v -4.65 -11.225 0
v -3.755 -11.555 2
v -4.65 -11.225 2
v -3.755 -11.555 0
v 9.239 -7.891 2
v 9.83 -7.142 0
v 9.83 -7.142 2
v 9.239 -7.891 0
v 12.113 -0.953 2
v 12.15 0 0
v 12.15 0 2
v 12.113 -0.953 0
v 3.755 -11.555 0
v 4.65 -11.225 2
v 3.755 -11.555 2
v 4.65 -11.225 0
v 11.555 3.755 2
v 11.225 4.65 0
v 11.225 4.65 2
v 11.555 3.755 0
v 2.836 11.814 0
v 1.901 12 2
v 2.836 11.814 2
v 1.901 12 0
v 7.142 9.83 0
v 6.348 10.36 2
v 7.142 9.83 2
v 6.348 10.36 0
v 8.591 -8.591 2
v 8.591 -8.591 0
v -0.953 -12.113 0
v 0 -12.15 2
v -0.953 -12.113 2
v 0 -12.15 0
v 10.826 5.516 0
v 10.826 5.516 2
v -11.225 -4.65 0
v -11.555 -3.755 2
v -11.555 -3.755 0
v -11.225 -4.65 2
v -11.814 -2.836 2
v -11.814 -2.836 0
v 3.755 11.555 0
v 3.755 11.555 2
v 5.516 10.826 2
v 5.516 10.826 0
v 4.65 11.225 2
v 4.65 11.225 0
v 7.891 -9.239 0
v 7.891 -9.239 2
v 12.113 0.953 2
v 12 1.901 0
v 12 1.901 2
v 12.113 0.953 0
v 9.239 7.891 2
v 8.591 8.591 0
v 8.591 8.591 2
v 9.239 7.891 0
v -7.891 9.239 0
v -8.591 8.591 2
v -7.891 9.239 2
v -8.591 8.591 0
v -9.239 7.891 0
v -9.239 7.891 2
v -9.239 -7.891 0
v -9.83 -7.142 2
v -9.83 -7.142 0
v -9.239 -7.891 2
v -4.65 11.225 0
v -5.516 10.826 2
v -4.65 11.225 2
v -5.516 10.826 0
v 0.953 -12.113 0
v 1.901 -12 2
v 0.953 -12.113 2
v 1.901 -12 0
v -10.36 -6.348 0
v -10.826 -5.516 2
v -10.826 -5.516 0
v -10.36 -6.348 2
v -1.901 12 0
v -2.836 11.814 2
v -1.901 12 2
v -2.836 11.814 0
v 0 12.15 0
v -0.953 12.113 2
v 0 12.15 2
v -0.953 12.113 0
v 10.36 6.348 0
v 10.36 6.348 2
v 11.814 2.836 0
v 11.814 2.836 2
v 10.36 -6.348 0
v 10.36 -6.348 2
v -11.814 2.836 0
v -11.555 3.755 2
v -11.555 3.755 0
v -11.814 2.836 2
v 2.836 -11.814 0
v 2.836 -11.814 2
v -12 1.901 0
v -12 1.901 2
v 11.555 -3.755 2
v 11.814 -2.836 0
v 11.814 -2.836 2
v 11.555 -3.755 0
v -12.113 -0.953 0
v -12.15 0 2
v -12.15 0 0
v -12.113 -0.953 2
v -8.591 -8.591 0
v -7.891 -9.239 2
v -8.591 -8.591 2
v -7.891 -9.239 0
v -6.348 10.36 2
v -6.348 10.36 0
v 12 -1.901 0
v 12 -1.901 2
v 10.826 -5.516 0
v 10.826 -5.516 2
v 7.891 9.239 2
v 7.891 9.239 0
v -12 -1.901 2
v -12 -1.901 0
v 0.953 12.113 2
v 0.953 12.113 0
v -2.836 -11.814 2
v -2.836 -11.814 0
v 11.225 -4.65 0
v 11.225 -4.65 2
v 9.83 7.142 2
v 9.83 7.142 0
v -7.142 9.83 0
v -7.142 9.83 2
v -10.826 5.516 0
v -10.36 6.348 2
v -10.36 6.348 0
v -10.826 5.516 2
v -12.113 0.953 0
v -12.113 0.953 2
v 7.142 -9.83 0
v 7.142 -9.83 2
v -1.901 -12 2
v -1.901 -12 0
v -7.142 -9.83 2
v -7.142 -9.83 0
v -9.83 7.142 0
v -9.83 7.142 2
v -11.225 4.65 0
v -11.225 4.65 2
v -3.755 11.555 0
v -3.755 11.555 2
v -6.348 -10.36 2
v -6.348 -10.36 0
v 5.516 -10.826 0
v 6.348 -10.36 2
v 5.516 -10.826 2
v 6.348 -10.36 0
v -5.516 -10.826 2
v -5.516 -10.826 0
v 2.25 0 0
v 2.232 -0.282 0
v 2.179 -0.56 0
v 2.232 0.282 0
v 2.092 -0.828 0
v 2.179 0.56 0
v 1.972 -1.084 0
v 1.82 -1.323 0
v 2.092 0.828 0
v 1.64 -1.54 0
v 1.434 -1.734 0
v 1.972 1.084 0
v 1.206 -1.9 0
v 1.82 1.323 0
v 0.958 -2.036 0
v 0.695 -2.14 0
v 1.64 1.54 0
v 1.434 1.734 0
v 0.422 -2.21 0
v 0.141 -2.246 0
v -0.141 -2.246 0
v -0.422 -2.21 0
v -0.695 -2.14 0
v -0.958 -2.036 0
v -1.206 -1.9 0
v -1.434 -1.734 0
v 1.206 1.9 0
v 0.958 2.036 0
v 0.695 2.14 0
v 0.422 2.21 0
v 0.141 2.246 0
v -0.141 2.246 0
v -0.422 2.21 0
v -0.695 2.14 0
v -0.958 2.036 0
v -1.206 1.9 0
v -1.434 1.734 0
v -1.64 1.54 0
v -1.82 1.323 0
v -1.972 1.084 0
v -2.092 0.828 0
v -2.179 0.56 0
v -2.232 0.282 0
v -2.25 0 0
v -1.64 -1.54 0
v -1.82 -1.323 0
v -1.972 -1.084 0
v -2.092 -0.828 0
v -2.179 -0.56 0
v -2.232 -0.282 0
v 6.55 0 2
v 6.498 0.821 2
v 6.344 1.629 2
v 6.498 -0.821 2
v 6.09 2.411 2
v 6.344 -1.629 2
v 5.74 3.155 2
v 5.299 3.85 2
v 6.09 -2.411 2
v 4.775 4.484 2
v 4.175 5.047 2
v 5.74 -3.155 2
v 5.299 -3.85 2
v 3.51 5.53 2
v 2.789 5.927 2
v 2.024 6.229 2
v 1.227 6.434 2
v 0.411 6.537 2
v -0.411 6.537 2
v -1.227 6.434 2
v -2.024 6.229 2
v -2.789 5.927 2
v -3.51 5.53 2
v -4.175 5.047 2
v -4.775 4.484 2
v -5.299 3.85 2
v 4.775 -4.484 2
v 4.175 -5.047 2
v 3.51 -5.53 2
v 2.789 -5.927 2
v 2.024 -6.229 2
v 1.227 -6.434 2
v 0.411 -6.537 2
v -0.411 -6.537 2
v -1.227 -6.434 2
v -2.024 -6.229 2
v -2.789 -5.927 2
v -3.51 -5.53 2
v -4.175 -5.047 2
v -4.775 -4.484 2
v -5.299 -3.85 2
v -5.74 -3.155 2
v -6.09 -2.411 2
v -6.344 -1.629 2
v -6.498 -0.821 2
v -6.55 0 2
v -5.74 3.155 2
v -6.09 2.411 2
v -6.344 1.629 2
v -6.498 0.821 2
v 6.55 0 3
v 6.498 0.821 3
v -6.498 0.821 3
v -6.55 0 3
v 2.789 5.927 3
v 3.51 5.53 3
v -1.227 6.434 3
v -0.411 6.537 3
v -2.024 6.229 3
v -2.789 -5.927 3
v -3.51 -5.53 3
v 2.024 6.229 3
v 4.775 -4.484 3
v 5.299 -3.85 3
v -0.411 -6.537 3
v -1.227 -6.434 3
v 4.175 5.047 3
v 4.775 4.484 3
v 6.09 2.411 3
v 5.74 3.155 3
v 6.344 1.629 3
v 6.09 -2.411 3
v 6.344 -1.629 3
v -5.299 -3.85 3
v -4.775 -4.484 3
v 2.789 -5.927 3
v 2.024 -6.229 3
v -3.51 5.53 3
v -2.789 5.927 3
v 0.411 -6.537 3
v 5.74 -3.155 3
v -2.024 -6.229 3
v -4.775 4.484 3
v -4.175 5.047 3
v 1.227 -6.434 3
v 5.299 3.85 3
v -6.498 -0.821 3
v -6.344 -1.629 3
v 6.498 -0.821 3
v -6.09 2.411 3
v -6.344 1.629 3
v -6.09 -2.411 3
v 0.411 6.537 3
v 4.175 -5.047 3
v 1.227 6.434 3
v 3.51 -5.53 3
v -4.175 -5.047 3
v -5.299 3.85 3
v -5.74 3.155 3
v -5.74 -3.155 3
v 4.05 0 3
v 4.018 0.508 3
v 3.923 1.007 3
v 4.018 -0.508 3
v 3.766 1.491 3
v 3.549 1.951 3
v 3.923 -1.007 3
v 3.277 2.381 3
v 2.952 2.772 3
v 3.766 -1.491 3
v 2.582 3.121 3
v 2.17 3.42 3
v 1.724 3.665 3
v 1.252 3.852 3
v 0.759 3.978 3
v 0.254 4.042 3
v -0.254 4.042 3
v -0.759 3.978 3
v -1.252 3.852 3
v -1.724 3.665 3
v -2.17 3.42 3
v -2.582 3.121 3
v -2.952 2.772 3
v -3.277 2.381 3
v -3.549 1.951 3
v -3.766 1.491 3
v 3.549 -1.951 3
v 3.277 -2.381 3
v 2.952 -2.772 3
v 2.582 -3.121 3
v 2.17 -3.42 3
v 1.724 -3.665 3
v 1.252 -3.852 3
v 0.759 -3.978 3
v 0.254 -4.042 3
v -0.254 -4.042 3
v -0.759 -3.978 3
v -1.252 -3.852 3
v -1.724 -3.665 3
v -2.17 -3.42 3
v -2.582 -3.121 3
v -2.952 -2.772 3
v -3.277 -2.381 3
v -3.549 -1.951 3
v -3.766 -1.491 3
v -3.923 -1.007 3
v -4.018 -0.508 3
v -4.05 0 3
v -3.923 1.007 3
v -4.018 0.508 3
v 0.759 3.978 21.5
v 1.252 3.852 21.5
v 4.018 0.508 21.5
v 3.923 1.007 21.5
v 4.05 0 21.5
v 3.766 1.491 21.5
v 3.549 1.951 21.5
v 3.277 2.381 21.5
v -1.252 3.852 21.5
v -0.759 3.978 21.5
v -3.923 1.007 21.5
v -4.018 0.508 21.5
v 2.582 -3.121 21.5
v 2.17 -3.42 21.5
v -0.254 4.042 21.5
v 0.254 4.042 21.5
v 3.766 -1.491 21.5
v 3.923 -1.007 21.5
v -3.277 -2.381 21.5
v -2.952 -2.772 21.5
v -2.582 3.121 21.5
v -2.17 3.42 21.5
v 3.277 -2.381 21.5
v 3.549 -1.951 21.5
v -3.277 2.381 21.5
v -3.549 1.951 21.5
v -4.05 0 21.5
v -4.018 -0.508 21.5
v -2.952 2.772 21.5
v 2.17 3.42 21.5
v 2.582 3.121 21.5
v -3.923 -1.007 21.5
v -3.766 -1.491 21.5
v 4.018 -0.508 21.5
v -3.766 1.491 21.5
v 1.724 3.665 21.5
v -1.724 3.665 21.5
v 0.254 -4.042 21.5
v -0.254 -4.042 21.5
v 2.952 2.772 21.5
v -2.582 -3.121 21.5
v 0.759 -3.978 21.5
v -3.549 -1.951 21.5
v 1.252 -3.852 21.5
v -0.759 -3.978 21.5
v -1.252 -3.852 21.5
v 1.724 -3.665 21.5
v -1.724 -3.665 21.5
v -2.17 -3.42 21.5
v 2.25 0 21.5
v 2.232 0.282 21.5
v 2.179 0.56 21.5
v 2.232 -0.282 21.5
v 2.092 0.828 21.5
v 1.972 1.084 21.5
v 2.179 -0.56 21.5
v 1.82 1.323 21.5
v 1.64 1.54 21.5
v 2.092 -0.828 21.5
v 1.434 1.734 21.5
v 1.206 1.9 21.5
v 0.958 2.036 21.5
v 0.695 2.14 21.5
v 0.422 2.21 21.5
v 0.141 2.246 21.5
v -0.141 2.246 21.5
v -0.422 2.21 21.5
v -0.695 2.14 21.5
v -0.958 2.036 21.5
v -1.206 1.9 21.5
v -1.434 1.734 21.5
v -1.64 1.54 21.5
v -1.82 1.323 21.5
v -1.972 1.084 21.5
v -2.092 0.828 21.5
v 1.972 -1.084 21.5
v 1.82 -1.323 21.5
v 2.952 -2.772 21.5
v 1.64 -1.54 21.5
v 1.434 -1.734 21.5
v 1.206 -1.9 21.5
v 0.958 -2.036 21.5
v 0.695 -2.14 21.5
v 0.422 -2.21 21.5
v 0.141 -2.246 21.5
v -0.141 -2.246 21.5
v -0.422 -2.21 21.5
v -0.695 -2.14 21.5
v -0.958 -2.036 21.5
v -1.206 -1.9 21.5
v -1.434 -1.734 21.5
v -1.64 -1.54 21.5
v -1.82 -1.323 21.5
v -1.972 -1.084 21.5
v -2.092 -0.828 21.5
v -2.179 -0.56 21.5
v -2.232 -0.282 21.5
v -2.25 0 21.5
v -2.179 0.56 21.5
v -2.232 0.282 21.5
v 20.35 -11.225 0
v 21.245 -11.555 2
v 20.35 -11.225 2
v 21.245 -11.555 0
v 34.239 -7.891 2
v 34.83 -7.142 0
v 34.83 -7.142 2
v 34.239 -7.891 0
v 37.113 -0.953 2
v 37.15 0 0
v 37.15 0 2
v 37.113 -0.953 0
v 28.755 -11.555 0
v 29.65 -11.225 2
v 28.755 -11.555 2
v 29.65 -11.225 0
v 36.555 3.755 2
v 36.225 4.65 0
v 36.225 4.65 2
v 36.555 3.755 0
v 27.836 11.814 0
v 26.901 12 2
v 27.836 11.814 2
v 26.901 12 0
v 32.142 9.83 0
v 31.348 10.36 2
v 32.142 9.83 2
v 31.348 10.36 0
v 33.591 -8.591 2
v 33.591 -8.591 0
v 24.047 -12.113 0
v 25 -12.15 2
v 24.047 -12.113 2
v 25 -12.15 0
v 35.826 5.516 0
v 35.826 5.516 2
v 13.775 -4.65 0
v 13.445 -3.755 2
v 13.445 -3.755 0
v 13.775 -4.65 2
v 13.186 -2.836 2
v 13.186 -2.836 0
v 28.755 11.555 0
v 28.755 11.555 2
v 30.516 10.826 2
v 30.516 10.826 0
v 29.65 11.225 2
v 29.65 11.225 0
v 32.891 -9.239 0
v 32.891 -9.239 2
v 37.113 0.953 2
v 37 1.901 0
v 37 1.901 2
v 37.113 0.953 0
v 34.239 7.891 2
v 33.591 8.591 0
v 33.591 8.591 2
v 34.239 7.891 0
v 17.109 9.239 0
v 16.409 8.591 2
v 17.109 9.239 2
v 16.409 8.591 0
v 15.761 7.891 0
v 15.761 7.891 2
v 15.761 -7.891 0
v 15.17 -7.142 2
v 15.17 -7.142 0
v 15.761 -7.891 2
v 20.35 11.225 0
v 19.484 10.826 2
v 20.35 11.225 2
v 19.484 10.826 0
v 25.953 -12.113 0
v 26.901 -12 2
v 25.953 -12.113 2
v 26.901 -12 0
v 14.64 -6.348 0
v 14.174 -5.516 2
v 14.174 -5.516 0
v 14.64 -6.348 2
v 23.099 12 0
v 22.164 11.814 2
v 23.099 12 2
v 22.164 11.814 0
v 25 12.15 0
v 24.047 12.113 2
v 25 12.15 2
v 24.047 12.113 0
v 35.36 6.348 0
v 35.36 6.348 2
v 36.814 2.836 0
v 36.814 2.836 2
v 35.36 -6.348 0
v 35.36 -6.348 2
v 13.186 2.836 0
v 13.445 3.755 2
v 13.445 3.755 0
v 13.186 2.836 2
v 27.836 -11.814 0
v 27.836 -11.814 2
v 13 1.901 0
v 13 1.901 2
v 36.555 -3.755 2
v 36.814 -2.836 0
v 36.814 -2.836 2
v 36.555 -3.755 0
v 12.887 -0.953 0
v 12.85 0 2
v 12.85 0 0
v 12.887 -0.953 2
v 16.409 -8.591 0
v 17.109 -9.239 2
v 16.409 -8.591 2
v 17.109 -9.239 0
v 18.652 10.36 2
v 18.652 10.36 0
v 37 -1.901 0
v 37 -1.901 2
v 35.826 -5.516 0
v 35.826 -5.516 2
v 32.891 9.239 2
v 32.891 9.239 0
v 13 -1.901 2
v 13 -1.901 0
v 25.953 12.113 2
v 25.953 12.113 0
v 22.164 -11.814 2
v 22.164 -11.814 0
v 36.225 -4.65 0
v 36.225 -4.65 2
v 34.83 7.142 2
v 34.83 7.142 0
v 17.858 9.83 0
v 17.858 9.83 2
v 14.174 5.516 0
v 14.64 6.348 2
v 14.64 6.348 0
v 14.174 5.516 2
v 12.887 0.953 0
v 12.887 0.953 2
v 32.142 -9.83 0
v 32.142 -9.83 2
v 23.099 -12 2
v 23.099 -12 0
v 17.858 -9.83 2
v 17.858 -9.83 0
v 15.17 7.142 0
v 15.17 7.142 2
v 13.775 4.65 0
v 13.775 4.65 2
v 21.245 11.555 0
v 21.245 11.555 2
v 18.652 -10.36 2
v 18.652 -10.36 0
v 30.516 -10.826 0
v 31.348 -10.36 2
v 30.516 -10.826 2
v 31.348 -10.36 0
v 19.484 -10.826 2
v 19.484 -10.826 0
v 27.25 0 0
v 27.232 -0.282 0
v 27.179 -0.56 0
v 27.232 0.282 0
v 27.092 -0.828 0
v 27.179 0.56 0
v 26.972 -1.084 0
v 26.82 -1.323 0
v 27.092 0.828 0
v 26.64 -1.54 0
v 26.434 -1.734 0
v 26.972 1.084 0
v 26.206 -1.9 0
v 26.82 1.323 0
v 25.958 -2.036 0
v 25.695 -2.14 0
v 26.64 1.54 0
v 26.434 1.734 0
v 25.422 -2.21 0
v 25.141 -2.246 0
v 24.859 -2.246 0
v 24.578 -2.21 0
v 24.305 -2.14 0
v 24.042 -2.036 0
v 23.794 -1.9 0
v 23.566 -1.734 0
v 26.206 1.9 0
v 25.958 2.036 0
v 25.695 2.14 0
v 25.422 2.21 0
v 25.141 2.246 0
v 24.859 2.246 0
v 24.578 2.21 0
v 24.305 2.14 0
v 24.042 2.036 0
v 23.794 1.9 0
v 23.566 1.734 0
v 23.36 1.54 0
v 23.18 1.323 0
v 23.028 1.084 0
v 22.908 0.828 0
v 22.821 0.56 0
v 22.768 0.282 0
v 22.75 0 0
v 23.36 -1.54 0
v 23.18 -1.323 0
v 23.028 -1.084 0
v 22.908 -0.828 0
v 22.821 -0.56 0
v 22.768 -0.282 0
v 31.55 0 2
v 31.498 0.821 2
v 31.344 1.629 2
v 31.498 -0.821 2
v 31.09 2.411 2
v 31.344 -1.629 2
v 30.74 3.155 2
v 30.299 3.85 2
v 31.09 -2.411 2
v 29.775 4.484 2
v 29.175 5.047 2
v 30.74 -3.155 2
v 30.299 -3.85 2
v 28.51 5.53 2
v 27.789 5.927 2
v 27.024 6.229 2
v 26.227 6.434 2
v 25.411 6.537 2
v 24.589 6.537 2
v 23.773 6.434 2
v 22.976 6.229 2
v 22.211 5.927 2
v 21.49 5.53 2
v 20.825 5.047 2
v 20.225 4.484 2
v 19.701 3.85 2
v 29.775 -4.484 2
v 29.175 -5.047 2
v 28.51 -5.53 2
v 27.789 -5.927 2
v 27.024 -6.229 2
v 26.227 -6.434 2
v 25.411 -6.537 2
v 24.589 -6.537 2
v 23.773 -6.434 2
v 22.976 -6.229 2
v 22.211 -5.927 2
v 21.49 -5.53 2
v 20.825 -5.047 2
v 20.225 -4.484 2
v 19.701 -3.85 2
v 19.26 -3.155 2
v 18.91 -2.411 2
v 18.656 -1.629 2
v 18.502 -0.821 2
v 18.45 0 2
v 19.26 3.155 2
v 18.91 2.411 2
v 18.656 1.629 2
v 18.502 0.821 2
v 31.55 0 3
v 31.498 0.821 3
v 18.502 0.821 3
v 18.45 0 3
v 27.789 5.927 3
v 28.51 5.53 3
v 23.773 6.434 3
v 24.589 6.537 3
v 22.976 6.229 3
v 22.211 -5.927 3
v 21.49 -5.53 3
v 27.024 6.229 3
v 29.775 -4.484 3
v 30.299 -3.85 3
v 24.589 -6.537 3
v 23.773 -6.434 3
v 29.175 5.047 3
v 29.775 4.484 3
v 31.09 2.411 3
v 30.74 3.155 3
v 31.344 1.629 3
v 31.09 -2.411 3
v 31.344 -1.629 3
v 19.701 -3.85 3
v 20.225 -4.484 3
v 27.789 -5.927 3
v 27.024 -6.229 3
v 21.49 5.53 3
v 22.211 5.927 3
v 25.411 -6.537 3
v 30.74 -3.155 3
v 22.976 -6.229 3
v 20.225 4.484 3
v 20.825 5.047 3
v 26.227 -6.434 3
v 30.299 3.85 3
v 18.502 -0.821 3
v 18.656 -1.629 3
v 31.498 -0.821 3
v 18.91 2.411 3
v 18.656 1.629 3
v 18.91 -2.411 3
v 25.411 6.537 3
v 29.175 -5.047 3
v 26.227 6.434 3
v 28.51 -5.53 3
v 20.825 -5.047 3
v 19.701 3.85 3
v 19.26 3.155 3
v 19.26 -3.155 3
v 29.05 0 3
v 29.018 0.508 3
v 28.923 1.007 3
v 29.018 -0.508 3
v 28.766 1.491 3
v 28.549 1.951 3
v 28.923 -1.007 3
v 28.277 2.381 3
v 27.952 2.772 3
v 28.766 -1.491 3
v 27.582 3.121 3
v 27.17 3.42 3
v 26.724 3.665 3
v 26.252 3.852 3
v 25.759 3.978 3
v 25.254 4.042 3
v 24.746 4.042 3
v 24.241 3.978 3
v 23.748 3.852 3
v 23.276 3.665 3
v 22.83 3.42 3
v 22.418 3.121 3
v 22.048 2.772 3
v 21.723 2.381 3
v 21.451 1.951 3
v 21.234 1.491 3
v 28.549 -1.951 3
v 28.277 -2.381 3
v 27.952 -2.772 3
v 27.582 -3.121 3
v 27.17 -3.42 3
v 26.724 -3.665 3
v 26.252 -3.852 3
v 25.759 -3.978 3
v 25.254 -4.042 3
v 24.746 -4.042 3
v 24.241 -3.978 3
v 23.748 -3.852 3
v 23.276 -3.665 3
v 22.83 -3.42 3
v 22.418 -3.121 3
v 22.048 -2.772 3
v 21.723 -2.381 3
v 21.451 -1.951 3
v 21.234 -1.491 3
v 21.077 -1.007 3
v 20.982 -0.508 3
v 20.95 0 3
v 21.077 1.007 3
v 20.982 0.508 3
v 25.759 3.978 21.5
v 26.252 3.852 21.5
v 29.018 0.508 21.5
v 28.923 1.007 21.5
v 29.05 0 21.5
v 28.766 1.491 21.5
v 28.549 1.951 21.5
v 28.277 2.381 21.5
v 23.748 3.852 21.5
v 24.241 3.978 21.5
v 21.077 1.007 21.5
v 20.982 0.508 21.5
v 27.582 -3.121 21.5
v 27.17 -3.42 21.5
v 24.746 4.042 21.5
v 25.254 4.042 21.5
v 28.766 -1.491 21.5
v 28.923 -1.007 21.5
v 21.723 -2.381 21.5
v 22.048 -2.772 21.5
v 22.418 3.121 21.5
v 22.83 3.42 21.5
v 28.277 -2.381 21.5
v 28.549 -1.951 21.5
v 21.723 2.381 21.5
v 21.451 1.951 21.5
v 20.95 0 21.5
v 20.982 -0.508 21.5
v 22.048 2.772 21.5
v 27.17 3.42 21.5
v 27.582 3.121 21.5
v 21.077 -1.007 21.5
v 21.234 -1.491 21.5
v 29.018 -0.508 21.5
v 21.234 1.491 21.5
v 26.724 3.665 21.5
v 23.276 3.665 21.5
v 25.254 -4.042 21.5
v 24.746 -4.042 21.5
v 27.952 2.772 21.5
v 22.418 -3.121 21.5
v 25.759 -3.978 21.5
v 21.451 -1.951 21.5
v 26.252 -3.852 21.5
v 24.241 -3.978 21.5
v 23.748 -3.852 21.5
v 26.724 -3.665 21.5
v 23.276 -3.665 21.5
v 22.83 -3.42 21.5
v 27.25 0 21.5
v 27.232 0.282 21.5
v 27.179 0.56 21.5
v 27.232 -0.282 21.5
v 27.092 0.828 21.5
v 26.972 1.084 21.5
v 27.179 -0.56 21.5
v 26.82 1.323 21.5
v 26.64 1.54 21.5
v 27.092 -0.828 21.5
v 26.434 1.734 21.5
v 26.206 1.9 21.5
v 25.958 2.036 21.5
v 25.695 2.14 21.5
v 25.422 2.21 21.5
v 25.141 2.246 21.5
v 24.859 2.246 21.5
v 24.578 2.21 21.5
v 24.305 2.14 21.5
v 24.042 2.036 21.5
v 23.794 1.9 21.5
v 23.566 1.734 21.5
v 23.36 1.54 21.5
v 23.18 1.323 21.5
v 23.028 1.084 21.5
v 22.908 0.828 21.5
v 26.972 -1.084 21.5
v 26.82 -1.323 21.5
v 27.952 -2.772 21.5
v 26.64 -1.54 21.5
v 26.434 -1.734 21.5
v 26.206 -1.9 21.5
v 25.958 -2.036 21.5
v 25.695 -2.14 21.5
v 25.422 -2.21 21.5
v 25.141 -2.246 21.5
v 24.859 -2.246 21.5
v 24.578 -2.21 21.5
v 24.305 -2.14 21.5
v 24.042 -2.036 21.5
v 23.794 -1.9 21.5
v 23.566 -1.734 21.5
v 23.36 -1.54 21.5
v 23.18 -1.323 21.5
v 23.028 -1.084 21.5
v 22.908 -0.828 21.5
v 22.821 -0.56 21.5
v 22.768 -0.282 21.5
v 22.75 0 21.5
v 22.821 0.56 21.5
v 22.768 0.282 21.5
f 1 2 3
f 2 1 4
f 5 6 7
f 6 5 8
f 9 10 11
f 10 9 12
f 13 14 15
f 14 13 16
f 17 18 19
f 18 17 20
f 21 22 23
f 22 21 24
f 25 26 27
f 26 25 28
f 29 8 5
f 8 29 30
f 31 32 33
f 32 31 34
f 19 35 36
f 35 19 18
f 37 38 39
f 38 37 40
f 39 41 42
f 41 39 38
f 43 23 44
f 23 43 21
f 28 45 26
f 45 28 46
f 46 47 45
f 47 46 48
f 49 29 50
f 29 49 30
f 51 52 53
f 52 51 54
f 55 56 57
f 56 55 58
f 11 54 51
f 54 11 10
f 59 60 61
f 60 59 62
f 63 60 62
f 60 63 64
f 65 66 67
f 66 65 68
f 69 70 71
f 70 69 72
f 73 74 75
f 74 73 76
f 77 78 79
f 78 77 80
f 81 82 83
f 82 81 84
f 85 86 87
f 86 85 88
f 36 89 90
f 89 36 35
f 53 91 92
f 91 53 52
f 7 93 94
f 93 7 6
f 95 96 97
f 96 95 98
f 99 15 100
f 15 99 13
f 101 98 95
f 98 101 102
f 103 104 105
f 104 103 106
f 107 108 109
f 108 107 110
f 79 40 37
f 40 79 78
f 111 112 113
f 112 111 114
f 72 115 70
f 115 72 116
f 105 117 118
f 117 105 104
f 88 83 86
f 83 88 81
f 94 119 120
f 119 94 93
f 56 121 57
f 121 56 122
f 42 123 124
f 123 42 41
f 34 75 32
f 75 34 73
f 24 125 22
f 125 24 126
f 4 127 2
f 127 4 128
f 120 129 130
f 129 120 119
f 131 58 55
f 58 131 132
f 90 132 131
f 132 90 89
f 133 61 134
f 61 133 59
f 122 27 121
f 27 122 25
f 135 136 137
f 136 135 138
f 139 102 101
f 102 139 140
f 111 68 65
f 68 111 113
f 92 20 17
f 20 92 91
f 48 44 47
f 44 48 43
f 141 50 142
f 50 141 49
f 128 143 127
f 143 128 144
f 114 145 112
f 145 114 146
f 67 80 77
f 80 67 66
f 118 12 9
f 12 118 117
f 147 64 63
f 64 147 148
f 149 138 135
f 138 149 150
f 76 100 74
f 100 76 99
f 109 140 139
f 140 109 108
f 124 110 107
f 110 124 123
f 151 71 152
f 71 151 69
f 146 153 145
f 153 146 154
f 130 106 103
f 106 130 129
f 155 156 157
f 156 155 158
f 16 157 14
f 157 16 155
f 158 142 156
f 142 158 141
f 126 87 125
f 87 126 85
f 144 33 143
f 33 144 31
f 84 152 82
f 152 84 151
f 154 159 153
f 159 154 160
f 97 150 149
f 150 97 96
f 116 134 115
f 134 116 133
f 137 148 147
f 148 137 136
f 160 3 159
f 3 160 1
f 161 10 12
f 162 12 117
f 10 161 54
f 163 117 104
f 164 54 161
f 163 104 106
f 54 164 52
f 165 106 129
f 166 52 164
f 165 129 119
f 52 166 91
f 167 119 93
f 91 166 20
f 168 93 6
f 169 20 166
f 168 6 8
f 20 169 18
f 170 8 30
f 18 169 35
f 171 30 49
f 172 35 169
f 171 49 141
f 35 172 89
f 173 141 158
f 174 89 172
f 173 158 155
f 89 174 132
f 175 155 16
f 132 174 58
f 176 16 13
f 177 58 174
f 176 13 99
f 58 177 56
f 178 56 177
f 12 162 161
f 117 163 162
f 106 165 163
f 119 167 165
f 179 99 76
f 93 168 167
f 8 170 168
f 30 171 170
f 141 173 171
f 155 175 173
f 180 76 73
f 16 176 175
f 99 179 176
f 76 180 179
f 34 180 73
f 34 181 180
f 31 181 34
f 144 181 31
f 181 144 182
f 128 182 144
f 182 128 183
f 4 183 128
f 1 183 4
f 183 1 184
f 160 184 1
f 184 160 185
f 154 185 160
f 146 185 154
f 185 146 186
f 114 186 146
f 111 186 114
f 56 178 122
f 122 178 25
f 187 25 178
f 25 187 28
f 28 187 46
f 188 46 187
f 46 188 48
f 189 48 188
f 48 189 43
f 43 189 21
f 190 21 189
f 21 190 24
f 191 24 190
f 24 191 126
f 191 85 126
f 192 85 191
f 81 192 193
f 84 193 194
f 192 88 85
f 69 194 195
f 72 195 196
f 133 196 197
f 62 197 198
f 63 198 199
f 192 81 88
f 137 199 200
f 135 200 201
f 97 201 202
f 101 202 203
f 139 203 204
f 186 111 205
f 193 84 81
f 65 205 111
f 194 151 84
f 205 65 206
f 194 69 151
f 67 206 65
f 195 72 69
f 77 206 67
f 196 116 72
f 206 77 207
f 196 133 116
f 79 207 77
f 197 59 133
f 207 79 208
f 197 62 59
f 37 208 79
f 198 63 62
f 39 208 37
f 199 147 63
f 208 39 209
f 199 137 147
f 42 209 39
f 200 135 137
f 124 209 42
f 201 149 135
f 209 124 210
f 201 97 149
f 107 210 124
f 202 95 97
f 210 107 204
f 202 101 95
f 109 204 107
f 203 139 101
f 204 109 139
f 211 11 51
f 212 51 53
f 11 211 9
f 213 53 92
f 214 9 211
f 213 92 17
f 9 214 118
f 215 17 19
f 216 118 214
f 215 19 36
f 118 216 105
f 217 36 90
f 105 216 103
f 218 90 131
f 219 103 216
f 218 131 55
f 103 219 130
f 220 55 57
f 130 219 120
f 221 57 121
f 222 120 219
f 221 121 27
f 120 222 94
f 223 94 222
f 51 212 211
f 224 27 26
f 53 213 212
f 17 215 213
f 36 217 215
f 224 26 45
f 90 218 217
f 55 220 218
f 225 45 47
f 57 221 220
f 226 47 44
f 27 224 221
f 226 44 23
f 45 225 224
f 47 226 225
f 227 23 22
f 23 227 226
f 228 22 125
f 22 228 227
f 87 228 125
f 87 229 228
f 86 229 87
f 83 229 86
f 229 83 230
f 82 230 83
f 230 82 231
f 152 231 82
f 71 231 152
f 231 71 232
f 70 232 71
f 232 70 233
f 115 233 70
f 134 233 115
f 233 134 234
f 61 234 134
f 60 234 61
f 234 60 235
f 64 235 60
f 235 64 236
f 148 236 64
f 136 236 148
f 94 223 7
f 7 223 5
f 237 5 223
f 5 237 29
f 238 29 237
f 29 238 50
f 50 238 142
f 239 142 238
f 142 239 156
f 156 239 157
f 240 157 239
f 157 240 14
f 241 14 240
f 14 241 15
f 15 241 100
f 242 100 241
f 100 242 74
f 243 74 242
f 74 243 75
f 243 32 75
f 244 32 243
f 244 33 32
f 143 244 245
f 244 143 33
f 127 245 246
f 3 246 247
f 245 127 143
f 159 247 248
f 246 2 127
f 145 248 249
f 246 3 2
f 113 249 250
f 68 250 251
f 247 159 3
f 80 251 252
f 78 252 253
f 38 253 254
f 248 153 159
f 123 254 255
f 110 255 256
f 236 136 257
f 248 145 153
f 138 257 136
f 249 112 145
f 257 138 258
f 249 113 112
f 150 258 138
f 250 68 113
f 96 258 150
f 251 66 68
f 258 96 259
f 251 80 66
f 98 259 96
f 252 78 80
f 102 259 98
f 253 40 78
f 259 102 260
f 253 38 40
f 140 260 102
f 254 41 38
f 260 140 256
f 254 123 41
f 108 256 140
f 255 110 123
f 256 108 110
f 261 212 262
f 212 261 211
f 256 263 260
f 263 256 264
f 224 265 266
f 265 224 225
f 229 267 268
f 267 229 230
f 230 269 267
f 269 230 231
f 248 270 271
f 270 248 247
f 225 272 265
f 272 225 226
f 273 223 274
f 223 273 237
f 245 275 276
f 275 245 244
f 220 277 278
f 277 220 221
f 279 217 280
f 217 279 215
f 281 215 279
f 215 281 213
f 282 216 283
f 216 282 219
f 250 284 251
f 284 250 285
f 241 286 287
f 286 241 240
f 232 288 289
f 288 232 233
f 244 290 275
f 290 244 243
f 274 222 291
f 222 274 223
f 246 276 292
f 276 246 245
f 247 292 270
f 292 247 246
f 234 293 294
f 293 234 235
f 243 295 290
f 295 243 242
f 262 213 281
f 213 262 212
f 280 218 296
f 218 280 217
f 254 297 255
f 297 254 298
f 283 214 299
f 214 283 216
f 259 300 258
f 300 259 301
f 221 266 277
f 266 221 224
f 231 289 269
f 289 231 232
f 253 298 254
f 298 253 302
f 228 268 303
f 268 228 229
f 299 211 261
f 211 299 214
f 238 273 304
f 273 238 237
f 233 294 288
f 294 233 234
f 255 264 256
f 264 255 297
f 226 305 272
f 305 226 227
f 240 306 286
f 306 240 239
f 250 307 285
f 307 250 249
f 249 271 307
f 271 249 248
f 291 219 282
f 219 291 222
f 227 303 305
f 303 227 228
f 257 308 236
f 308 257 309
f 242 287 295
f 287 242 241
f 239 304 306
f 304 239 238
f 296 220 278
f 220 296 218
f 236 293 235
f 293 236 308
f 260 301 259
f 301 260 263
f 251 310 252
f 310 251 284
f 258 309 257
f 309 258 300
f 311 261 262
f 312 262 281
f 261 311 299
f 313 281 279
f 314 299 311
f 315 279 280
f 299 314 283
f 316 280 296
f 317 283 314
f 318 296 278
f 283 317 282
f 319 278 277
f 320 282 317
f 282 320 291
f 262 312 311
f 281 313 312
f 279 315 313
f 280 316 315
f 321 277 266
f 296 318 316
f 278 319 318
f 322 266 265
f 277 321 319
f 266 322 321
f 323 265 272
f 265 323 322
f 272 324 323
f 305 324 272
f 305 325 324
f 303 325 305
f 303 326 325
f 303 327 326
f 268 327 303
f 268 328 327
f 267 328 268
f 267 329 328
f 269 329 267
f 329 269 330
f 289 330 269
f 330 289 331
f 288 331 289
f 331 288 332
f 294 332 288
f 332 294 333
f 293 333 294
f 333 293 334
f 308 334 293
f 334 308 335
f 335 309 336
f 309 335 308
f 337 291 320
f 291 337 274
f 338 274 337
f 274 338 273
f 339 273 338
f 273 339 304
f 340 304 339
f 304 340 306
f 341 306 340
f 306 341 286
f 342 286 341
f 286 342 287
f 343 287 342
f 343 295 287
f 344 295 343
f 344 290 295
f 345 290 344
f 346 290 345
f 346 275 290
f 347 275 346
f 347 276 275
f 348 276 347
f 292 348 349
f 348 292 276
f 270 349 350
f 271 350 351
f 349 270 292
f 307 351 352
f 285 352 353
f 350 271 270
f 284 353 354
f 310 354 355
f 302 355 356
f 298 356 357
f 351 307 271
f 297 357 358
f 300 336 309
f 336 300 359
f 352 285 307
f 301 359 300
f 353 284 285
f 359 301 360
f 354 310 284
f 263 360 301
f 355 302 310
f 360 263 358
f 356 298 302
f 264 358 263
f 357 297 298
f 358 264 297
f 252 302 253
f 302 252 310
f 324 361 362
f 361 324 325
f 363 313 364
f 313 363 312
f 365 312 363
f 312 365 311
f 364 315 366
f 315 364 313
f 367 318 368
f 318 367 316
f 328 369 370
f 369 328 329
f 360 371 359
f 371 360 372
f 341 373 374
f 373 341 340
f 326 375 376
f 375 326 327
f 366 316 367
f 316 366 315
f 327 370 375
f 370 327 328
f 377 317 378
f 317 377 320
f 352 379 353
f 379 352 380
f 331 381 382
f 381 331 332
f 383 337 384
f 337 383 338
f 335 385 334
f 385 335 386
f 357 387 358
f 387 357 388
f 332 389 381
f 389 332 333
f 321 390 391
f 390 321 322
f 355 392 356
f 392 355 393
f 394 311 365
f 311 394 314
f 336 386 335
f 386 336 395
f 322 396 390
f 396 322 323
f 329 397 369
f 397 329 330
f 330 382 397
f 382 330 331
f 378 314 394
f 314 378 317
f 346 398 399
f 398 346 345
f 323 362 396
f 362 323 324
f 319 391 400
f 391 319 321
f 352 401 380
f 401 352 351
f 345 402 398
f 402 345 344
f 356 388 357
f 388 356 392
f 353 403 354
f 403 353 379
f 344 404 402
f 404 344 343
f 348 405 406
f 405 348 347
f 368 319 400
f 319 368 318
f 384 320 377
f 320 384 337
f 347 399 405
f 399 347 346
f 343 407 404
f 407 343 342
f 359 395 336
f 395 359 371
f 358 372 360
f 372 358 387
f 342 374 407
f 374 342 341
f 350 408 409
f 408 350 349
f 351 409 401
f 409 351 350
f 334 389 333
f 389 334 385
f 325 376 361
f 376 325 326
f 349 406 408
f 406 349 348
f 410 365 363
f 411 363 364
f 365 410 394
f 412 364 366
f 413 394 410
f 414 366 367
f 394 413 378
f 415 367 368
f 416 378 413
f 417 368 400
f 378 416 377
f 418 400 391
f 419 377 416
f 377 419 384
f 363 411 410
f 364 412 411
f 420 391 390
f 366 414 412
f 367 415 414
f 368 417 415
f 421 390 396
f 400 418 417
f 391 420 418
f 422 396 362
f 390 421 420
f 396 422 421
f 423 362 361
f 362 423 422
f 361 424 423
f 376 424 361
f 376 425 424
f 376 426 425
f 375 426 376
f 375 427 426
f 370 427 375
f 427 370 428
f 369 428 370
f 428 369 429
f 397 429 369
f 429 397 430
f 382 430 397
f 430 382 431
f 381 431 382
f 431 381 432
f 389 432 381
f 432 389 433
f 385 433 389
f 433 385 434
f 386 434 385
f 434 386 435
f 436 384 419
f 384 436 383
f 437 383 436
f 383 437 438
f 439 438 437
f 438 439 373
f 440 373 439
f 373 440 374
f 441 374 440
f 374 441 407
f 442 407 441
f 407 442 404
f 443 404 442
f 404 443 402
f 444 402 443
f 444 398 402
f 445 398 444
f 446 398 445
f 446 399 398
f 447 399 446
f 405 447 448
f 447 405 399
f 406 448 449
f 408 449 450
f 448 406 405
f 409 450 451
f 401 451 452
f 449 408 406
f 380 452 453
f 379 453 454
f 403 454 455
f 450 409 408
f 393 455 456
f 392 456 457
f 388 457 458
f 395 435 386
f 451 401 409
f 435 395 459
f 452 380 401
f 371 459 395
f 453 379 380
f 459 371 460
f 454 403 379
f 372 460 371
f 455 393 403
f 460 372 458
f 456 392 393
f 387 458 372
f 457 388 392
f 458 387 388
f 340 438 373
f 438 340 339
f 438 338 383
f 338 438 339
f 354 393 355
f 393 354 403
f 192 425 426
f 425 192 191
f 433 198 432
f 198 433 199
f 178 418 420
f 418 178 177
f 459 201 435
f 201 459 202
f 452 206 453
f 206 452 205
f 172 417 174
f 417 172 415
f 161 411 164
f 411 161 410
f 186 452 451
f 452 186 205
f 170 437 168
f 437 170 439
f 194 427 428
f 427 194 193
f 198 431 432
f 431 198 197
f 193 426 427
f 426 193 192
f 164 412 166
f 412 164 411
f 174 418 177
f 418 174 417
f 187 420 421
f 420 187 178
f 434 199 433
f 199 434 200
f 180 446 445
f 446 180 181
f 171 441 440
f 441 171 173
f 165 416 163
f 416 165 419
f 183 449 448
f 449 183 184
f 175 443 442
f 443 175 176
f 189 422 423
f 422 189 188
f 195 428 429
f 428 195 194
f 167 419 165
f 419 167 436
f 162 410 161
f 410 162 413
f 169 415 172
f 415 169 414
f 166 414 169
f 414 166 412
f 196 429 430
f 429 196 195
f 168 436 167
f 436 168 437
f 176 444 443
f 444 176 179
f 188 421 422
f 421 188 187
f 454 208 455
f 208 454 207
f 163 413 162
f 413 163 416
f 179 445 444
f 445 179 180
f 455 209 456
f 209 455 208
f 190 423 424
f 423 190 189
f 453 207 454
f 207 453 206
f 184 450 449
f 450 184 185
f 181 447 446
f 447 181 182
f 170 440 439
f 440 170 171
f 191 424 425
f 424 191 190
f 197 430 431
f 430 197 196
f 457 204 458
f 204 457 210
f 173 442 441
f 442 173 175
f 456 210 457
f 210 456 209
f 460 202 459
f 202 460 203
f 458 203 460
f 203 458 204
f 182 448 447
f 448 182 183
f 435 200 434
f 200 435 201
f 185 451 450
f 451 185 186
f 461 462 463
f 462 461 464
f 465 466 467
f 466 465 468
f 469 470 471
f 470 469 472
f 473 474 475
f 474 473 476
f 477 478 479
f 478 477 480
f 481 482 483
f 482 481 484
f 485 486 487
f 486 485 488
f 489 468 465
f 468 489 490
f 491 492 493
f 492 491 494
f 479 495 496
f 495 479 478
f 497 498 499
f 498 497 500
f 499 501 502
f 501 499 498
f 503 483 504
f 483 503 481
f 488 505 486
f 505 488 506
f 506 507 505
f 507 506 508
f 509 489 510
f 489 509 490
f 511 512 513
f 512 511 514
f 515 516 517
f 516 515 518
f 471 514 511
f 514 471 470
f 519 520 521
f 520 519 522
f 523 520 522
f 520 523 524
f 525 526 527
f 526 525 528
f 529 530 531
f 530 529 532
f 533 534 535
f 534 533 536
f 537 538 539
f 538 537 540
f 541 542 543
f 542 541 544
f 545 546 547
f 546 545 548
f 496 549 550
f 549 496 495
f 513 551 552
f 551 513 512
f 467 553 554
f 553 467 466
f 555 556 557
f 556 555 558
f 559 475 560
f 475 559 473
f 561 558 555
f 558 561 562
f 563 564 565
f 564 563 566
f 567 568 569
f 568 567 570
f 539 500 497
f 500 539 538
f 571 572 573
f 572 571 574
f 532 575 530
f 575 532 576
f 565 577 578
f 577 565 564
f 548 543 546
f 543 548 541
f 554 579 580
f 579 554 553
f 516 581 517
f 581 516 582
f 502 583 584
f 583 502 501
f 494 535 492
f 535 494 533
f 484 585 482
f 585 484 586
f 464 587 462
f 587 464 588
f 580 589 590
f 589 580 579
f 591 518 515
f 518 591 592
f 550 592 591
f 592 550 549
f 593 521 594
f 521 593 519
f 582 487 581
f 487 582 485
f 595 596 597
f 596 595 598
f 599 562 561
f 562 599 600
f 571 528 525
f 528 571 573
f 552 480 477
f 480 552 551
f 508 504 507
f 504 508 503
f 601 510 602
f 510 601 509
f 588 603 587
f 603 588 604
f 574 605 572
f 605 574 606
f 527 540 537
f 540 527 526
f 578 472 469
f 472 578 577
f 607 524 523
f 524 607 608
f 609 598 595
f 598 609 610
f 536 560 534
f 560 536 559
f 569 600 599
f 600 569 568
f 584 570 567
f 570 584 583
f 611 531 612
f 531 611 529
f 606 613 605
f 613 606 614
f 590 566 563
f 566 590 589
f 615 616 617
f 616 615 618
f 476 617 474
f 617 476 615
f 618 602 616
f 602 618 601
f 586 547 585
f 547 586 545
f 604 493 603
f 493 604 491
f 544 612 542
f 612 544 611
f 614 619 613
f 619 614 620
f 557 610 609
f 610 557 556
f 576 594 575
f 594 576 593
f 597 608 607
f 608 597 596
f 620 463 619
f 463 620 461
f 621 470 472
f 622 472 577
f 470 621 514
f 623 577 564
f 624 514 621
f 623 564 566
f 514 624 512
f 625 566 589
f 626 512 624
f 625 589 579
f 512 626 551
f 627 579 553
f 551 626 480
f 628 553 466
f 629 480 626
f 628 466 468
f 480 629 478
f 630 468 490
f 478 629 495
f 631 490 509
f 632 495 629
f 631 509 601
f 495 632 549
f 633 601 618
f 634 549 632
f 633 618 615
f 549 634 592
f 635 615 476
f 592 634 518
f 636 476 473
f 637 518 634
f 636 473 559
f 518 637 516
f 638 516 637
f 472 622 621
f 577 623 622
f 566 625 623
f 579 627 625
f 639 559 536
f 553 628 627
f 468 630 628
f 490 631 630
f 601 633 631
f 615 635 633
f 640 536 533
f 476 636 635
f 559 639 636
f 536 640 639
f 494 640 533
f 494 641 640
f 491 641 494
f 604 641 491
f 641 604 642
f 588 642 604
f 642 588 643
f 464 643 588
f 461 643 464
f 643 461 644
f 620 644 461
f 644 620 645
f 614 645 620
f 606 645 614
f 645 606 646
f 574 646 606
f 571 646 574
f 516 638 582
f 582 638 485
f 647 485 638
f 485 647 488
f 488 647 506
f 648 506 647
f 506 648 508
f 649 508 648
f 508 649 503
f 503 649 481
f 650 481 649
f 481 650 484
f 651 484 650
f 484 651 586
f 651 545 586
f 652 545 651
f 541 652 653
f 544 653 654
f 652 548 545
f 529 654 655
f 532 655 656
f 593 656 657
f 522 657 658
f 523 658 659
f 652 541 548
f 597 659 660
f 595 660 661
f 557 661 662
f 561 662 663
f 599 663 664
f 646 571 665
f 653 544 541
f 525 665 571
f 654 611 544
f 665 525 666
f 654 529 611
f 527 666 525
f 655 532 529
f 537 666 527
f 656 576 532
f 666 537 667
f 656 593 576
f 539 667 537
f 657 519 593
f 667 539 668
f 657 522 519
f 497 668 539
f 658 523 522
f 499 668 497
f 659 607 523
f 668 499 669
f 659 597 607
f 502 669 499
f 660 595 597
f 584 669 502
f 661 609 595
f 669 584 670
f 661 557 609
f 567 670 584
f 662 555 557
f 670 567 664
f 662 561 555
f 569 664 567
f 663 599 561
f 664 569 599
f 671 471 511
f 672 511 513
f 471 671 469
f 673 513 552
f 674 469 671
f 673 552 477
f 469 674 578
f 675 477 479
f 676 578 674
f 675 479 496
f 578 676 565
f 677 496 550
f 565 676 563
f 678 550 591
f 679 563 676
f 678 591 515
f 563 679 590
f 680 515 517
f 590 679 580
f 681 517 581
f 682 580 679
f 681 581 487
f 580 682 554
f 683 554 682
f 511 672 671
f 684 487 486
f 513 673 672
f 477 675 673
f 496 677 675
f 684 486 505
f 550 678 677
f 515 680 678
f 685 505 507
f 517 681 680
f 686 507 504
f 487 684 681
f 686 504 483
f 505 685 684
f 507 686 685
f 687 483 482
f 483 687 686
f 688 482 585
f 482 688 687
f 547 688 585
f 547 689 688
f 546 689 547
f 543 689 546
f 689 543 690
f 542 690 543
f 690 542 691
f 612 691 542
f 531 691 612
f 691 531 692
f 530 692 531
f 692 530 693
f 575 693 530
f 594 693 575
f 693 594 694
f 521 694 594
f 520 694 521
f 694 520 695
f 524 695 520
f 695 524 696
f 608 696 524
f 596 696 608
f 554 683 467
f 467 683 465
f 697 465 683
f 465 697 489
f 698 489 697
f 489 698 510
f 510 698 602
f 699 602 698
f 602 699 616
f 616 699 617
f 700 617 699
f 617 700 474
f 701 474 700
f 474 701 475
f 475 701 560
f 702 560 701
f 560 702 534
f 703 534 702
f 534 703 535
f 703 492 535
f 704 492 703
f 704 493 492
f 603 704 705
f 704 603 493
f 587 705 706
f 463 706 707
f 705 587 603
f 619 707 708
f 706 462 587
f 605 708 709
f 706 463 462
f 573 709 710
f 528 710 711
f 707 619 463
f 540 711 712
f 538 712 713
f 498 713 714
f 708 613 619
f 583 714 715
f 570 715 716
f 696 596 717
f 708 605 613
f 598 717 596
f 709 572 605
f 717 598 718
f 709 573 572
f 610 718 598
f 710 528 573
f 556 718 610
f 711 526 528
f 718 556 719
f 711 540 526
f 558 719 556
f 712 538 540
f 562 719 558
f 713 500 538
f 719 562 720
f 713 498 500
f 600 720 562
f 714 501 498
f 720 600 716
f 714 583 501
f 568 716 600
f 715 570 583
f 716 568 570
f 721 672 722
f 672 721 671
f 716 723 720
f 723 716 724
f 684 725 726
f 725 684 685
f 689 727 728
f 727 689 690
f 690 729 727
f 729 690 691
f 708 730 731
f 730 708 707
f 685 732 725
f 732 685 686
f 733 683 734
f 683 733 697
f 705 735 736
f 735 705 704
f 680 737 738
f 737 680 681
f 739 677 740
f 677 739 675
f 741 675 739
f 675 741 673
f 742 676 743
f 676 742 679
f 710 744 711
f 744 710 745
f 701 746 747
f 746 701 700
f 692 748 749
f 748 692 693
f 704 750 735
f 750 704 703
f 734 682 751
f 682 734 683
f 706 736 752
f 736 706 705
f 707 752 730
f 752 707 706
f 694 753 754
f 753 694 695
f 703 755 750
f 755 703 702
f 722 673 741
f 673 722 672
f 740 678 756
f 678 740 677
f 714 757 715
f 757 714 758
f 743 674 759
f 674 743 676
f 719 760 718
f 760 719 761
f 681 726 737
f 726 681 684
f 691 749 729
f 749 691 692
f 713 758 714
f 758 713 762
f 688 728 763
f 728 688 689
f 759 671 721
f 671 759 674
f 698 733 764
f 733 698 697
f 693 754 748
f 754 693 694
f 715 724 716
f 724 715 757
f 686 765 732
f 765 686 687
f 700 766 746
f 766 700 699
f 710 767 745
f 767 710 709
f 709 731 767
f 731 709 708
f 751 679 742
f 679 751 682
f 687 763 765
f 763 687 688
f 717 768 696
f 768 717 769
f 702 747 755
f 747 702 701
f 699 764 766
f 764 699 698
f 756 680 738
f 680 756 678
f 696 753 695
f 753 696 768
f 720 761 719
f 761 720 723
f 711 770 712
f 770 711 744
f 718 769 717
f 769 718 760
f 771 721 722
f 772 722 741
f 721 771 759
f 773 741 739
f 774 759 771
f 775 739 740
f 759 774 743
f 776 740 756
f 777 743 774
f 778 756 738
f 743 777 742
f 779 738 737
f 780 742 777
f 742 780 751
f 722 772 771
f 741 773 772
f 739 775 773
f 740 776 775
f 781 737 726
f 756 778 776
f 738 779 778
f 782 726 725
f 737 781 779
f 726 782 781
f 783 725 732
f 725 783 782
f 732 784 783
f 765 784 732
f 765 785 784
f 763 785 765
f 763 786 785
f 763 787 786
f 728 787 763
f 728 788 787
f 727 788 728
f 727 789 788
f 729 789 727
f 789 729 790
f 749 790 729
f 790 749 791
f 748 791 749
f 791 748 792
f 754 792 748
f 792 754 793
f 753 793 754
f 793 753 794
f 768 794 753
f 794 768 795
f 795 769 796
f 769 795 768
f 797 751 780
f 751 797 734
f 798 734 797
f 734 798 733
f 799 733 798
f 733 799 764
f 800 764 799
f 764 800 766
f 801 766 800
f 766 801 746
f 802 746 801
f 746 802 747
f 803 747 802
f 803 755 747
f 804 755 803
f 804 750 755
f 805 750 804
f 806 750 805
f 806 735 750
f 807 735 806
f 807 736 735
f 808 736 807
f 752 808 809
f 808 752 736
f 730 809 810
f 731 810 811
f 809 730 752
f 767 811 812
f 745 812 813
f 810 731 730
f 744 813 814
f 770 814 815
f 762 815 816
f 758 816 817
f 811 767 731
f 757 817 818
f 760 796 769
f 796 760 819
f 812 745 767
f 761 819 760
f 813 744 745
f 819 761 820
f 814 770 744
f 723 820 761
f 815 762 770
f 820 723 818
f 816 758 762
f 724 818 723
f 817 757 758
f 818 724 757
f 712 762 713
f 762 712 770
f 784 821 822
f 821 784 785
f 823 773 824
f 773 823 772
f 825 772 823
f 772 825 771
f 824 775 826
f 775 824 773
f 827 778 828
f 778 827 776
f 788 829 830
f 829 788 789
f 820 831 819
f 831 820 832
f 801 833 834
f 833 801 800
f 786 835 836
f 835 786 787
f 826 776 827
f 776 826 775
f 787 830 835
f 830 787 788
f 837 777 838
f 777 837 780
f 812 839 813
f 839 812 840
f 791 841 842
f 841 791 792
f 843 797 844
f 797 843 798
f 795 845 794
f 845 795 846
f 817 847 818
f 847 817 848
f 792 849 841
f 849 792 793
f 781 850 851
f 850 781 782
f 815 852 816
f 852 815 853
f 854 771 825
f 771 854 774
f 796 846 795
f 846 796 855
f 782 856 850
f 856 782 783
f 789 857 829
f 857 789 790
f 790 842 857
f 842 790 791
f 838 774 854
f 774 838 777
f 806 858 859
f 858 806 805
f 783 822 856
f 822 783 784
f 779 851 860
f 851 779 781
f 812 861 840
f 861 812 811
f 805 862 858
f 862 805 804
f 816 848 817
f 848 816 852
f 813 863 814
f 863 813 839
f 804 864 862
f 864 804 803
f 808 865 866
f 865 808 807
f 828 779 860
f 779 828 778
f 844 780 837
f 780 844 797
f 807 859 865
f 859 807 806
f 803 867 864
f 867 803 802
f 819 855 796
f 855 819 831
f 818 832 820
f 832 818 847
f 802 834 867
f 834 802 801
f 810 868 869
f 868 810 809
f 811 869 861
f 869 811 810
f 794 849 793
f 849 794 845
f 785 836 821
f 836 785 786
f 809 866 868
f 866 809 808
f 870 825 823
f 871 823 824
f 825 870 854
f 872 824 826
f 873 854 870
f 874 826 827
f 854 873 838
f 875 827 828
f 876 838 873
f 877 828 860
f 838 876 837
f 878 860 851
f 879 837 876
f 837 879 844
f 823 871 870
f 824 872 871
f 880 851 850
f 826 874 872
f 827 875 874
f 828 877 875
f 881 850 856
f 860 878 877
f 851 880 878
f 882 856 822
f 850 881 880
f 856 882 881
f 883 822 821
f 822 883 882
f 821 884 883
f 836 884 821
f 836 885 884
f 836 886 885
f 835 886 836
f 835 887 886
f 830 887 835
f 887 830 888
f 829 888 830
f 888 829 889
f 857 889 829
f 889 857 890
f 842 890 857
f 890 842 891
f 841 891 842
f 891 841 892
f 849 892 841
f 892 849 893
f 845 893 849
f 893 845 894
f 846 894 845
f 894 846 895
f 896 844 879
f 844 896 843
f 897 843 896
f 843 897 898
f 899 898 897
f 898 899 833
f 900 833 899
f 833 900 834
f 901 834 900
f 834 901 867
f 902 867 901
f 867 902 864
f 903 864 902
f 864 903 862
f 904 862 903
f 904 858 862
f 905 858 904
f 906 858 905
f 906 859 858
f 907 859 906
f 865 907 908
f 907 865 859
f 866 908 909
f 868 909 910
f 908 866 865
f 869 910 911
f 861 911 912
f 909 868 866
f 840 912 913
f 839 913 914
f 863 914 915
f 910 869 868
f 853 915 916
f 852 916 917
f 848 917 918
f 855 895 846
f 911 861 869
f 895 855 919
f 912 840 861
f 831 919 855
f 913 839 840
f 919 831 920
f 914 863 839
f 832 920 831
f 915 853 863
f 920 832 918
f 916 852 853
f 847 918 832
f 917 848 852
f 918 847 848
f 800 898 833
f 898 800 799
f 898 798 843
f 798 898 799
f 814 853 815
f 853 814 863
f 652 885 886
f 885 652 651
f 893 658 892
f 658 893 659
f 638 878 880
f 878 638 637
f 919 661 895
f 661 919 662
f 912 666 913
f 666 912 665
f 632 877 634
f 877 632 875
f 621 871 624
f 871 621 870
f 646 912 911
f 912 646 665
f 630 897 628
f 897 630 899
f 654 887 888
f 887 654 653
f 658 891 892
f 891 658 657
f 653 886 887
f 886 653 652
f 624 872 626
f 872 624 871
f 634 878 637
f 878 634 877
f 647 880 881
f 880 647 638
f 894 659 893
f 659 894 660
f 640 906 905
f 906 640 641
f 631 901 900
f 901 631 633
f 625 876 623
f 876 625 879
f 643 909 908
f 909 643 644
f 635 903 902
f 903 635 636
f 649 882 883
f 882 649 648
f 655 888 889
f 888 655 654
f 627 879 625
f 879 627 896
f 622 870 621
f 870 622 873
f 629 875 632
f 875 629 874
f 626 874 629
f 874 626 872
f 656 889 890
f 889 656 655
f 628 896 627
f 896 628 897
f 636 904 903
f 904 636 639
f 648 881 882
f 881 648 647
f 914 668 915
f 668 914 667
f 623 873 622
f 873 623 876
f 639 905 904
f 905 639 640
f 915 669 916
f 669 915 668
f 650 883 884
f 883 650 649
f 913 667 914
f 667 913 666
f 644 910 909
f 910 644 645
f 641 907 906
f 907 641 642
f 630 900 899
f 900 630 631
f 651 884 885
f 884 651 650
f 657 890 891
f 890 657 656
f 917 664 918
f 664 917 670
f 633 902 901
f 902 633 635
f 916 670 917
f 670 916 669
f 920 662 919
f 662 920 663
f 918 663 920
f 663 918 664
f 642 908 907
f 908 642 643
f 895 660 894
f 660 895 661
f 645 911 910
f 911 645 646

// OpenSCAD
// file: ../888_2012.scad
//valec k disku do mechoveho kola

include <../parameters.scad>

cylinder_1_thickness = 2;
cylinder_1_diameter = 608_bearing_outer_diameter+2;
cylinder_2_thickness = 3;
cylinder_2_diameter = 608_bearing_inner_diameter+5;

module 888_2012 () {
    difference() {
        union() {
            cylinder(h=cylinder_1_thickness, d=cylinder_1_diameter, $fn=80);
            cylinder(h=cylinder_2_thickness, d=cylinder_2_diameter, $fn=50);
            cylinder(h=wheel_inner_thickness/2+wheel_disc_upper_thickness+cylinder_1_thickness+(cylinder_2_thickness-cylinder_1_thickness) - global_clearance,
                  d=608_bearing_inner_diameter, $fn=50);
        }
        translate([0,0,-1])
            cylinder(h=wheel_inner_thickness, d=M4_screw_diameter, $fn=50);
    }
}

888_2012();
// main file
include <../../parameters.scad>
use <../888_2012.scad>


888_2012();
translate([25 , 0, 0]) 888_2012();
